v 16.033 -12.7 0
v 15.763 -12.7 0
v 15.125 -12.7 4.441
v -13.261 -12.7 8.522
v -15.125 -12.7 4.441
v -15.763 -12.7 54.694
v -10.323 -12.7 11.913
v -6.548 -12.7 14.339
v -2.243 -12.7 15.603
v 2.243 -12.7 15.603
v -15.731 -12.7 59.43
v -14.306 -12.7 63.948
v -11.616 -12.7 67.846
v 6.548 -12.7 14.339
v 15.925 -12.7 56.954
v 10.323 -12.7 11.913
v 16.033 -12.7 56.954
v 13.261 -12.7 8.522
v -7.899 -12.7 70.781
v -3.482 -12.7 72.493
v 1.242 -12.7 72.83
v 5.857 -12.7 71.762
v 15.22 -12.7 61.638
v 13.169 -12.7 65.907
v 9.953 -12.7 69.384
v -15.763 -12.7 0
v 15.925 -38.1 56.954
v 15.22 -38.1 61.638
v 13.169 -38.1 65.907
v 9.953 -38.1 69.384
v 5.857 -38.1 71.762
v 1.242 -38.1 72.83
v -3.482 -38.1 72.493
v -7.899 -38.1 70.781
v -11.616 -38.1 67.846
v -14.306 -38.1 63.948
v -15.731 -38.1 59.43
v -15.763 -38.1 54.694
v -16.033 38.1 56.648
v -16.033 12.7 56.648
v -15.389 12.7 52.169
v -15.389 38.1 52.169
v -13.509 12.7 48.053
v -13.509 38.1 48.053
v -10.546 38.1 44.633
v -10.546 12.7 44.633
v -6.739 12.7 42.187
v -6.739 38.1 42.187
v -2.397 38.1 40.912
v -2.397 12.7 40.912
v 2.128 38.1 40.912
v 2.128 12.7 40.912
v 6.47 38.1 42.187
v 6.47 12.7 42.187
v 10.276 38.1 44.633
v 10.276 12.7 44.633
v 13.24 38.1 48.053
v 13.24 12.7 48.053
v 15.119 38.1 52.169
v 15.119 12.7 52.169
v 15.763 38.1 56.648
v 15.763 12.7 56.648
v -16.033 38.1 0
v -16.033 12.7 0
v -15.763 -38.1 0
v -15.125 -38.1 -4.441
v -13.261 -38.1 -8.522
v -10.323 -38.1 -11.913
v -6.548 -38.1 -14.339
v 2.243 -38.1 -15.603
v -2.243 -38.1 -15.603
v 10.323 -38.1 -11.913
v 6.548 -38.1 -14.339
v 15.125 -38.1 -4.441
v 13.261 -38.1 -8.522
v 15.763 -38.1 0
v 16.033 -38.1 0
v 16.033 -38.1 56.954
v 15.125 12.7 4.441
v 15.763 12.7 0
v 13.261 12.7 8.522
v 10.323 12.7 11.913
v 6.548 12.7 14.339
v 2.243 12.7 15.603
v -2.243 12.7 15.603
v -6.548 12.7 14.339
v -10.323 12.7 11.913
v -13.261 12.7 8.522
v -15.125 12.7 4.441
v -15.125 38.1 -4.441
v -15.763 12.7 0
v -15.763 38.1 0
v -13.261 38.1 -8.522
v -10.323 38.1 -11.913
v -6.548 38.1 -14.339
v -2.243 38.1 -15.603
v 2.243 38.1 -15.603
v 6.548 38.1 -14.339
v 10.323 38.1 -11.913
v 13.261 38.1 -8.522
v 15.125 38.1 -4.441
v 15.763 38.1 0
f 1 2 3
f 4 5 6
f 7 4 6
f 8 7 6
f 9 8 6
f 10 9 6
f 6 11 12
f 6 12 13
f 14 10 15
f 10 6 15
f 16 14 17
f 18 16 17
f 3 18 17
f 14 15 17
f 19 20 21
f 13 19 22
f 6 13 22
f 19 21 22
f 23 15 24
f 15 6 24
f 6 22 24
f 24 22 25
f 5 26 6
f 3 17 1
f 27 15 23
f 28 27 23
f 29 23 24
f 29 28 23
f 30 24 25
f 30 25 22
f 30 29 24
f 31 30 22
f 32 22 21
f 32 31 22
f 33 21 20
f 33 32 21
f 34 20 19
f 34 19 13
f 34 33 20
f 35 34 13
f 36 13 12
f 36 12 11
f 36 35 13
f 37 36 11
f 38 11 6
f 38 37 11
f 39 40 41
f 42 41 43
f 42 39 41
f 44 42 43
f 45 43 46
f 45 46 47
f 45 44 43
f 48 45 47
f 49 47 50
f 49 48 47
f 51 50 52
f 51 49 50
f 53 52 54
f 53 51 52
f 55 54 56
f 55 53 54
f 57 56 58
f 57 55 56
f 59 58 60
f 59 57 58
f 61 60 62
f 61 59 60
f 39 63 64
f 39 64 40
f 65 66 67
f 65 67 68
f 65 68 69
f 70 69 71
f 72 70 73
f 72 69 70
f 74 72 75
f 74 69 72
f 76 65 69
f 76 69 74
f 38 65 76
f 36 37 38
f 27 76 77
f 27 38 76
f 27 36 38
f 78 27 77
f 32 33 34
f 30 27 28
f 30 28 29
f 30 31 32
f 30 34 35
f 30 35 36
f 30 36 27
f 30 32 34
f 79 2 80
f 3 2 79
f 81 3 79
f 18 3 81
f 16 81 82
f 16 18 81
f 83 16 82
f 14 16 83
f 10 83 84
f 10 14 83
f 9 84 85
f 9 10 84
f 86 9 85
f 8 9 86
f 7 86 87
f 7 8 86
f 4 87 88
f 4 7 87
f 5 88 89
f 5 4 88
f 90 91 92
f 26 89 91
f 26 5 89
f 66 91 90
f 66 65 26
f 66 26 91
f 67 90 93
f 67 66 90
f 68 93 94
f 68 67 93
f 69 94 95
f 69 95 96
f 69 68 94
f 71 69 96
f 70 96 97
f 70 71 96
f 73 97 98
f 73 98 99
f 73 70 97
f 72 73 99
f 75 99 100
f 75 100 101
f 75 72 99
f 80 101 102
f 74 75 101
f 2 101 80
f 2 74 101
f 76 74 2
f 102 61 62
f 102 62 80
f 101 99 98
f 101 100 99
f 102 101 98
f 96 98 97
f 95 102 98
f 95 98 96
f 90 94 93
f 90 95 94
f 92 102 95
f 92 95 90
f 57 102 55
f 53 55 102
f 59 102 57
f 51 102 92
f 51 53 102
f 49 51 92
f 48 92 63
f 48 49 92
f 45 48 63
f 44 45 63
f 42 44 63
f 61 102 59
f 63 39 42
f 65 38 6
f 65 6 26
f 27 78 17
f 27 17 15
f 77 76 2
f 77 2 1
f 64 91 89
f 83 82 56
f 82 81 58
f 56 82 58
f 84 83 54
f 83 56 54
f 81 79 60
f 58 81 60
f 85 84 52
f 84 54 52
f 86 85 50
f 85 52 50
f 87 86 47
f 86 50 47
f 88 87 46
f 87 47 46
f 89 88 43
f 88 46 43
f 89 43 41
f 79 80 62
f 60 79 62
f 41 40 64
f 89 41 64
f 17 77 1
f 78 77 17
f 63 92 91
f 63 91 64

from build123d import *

# Parameters (mm, degrees)
F0_R     = 15.7634364534
F1_DEPTH = 38.1
F2_DEPTH = 38.1
F6_DEPTH = 25.4
F7_DEPTH = 25.4
F8_DEPTH = 25.4


with BuildPart() as f1:
    # F0 (on Front) → F1 (new body)
    with BuildSketch(Plane.XZ):
        Circle(F0_R)
    extrude(amount=F1_DEPTH)

    # F2 (add): a face of the model
    f2_faces = [f1.faces().sort_by_distance(p)[0] for p in [
        (0, 0, 0),
    ]]
    extrude(f2_faces, amount=F2_DEPTH)

    # F5 (on face) → F6 (join)
    with BuildSketch(Plane(origin=(0, 38.1, 0), x_dir=(-1, 0, 0), z_dir=(0, 1, 0))):
        with BuildLine():
            Line((-15.7634364534, 56.6483028233), (-15.7634364534, 0))
            ThreePointArc((-15.7634364534, 0), (0, 15.7634364534), (15.7634364534, 0))
            Line((15.7634364534, 0), (16.0325393081, 0))
            Line((16.0325393081, 0), (16.0325393081, 56.6483028233))
            ThreePointArc((16.0325393081, 56.6483028233), (0.1345514273, 40.7503149426), (-15.7634364534, 56.6483028233))
        make_face()
    extrude(amount=-F6_DEPTH)

    # F3 (on face) → F7 (join)
    with BuildSketch(Plane.XZ.offset(38.1)):
        with BuildLine():
            Line((-15.7634364534, 56.9536834955), (-15.7634364534, 0))
            ThreePointArc((-15.7634364534, 0), (0, 15.7634364534), (15.7634364534, 0))
            Line((15.7634364534, 0), (16.0325393081, 0))
            Line((16.0325393081, 0), (16.0325393081, 56.9536834955))
            Line((16.0325393081, 56.9536834955), (-15.7634364534, 56.9536834955))
        make_face()
    extrude(amount=-F7_DEPTH)

    # F4 (on face) → F8 (join)
    with BuildSketch(Plane.XZ.offset(38.1)):
        with BuildLine():
            Line((-15.7634364534, 56.9536834955), (15.9245655957, 56.9536834955))
            ThreePointArc((15.9245655957, 56.9536834955), (-1.132676387, 72.837915728), (-15.7634364534, 54.6940683534))
            Line((-15.7634364534, 54.6940683534), (-15.7634364534, 56.9536834955))
        make_face()
    extrude(amount=-F8_DEPTH)


solid = f1.part
